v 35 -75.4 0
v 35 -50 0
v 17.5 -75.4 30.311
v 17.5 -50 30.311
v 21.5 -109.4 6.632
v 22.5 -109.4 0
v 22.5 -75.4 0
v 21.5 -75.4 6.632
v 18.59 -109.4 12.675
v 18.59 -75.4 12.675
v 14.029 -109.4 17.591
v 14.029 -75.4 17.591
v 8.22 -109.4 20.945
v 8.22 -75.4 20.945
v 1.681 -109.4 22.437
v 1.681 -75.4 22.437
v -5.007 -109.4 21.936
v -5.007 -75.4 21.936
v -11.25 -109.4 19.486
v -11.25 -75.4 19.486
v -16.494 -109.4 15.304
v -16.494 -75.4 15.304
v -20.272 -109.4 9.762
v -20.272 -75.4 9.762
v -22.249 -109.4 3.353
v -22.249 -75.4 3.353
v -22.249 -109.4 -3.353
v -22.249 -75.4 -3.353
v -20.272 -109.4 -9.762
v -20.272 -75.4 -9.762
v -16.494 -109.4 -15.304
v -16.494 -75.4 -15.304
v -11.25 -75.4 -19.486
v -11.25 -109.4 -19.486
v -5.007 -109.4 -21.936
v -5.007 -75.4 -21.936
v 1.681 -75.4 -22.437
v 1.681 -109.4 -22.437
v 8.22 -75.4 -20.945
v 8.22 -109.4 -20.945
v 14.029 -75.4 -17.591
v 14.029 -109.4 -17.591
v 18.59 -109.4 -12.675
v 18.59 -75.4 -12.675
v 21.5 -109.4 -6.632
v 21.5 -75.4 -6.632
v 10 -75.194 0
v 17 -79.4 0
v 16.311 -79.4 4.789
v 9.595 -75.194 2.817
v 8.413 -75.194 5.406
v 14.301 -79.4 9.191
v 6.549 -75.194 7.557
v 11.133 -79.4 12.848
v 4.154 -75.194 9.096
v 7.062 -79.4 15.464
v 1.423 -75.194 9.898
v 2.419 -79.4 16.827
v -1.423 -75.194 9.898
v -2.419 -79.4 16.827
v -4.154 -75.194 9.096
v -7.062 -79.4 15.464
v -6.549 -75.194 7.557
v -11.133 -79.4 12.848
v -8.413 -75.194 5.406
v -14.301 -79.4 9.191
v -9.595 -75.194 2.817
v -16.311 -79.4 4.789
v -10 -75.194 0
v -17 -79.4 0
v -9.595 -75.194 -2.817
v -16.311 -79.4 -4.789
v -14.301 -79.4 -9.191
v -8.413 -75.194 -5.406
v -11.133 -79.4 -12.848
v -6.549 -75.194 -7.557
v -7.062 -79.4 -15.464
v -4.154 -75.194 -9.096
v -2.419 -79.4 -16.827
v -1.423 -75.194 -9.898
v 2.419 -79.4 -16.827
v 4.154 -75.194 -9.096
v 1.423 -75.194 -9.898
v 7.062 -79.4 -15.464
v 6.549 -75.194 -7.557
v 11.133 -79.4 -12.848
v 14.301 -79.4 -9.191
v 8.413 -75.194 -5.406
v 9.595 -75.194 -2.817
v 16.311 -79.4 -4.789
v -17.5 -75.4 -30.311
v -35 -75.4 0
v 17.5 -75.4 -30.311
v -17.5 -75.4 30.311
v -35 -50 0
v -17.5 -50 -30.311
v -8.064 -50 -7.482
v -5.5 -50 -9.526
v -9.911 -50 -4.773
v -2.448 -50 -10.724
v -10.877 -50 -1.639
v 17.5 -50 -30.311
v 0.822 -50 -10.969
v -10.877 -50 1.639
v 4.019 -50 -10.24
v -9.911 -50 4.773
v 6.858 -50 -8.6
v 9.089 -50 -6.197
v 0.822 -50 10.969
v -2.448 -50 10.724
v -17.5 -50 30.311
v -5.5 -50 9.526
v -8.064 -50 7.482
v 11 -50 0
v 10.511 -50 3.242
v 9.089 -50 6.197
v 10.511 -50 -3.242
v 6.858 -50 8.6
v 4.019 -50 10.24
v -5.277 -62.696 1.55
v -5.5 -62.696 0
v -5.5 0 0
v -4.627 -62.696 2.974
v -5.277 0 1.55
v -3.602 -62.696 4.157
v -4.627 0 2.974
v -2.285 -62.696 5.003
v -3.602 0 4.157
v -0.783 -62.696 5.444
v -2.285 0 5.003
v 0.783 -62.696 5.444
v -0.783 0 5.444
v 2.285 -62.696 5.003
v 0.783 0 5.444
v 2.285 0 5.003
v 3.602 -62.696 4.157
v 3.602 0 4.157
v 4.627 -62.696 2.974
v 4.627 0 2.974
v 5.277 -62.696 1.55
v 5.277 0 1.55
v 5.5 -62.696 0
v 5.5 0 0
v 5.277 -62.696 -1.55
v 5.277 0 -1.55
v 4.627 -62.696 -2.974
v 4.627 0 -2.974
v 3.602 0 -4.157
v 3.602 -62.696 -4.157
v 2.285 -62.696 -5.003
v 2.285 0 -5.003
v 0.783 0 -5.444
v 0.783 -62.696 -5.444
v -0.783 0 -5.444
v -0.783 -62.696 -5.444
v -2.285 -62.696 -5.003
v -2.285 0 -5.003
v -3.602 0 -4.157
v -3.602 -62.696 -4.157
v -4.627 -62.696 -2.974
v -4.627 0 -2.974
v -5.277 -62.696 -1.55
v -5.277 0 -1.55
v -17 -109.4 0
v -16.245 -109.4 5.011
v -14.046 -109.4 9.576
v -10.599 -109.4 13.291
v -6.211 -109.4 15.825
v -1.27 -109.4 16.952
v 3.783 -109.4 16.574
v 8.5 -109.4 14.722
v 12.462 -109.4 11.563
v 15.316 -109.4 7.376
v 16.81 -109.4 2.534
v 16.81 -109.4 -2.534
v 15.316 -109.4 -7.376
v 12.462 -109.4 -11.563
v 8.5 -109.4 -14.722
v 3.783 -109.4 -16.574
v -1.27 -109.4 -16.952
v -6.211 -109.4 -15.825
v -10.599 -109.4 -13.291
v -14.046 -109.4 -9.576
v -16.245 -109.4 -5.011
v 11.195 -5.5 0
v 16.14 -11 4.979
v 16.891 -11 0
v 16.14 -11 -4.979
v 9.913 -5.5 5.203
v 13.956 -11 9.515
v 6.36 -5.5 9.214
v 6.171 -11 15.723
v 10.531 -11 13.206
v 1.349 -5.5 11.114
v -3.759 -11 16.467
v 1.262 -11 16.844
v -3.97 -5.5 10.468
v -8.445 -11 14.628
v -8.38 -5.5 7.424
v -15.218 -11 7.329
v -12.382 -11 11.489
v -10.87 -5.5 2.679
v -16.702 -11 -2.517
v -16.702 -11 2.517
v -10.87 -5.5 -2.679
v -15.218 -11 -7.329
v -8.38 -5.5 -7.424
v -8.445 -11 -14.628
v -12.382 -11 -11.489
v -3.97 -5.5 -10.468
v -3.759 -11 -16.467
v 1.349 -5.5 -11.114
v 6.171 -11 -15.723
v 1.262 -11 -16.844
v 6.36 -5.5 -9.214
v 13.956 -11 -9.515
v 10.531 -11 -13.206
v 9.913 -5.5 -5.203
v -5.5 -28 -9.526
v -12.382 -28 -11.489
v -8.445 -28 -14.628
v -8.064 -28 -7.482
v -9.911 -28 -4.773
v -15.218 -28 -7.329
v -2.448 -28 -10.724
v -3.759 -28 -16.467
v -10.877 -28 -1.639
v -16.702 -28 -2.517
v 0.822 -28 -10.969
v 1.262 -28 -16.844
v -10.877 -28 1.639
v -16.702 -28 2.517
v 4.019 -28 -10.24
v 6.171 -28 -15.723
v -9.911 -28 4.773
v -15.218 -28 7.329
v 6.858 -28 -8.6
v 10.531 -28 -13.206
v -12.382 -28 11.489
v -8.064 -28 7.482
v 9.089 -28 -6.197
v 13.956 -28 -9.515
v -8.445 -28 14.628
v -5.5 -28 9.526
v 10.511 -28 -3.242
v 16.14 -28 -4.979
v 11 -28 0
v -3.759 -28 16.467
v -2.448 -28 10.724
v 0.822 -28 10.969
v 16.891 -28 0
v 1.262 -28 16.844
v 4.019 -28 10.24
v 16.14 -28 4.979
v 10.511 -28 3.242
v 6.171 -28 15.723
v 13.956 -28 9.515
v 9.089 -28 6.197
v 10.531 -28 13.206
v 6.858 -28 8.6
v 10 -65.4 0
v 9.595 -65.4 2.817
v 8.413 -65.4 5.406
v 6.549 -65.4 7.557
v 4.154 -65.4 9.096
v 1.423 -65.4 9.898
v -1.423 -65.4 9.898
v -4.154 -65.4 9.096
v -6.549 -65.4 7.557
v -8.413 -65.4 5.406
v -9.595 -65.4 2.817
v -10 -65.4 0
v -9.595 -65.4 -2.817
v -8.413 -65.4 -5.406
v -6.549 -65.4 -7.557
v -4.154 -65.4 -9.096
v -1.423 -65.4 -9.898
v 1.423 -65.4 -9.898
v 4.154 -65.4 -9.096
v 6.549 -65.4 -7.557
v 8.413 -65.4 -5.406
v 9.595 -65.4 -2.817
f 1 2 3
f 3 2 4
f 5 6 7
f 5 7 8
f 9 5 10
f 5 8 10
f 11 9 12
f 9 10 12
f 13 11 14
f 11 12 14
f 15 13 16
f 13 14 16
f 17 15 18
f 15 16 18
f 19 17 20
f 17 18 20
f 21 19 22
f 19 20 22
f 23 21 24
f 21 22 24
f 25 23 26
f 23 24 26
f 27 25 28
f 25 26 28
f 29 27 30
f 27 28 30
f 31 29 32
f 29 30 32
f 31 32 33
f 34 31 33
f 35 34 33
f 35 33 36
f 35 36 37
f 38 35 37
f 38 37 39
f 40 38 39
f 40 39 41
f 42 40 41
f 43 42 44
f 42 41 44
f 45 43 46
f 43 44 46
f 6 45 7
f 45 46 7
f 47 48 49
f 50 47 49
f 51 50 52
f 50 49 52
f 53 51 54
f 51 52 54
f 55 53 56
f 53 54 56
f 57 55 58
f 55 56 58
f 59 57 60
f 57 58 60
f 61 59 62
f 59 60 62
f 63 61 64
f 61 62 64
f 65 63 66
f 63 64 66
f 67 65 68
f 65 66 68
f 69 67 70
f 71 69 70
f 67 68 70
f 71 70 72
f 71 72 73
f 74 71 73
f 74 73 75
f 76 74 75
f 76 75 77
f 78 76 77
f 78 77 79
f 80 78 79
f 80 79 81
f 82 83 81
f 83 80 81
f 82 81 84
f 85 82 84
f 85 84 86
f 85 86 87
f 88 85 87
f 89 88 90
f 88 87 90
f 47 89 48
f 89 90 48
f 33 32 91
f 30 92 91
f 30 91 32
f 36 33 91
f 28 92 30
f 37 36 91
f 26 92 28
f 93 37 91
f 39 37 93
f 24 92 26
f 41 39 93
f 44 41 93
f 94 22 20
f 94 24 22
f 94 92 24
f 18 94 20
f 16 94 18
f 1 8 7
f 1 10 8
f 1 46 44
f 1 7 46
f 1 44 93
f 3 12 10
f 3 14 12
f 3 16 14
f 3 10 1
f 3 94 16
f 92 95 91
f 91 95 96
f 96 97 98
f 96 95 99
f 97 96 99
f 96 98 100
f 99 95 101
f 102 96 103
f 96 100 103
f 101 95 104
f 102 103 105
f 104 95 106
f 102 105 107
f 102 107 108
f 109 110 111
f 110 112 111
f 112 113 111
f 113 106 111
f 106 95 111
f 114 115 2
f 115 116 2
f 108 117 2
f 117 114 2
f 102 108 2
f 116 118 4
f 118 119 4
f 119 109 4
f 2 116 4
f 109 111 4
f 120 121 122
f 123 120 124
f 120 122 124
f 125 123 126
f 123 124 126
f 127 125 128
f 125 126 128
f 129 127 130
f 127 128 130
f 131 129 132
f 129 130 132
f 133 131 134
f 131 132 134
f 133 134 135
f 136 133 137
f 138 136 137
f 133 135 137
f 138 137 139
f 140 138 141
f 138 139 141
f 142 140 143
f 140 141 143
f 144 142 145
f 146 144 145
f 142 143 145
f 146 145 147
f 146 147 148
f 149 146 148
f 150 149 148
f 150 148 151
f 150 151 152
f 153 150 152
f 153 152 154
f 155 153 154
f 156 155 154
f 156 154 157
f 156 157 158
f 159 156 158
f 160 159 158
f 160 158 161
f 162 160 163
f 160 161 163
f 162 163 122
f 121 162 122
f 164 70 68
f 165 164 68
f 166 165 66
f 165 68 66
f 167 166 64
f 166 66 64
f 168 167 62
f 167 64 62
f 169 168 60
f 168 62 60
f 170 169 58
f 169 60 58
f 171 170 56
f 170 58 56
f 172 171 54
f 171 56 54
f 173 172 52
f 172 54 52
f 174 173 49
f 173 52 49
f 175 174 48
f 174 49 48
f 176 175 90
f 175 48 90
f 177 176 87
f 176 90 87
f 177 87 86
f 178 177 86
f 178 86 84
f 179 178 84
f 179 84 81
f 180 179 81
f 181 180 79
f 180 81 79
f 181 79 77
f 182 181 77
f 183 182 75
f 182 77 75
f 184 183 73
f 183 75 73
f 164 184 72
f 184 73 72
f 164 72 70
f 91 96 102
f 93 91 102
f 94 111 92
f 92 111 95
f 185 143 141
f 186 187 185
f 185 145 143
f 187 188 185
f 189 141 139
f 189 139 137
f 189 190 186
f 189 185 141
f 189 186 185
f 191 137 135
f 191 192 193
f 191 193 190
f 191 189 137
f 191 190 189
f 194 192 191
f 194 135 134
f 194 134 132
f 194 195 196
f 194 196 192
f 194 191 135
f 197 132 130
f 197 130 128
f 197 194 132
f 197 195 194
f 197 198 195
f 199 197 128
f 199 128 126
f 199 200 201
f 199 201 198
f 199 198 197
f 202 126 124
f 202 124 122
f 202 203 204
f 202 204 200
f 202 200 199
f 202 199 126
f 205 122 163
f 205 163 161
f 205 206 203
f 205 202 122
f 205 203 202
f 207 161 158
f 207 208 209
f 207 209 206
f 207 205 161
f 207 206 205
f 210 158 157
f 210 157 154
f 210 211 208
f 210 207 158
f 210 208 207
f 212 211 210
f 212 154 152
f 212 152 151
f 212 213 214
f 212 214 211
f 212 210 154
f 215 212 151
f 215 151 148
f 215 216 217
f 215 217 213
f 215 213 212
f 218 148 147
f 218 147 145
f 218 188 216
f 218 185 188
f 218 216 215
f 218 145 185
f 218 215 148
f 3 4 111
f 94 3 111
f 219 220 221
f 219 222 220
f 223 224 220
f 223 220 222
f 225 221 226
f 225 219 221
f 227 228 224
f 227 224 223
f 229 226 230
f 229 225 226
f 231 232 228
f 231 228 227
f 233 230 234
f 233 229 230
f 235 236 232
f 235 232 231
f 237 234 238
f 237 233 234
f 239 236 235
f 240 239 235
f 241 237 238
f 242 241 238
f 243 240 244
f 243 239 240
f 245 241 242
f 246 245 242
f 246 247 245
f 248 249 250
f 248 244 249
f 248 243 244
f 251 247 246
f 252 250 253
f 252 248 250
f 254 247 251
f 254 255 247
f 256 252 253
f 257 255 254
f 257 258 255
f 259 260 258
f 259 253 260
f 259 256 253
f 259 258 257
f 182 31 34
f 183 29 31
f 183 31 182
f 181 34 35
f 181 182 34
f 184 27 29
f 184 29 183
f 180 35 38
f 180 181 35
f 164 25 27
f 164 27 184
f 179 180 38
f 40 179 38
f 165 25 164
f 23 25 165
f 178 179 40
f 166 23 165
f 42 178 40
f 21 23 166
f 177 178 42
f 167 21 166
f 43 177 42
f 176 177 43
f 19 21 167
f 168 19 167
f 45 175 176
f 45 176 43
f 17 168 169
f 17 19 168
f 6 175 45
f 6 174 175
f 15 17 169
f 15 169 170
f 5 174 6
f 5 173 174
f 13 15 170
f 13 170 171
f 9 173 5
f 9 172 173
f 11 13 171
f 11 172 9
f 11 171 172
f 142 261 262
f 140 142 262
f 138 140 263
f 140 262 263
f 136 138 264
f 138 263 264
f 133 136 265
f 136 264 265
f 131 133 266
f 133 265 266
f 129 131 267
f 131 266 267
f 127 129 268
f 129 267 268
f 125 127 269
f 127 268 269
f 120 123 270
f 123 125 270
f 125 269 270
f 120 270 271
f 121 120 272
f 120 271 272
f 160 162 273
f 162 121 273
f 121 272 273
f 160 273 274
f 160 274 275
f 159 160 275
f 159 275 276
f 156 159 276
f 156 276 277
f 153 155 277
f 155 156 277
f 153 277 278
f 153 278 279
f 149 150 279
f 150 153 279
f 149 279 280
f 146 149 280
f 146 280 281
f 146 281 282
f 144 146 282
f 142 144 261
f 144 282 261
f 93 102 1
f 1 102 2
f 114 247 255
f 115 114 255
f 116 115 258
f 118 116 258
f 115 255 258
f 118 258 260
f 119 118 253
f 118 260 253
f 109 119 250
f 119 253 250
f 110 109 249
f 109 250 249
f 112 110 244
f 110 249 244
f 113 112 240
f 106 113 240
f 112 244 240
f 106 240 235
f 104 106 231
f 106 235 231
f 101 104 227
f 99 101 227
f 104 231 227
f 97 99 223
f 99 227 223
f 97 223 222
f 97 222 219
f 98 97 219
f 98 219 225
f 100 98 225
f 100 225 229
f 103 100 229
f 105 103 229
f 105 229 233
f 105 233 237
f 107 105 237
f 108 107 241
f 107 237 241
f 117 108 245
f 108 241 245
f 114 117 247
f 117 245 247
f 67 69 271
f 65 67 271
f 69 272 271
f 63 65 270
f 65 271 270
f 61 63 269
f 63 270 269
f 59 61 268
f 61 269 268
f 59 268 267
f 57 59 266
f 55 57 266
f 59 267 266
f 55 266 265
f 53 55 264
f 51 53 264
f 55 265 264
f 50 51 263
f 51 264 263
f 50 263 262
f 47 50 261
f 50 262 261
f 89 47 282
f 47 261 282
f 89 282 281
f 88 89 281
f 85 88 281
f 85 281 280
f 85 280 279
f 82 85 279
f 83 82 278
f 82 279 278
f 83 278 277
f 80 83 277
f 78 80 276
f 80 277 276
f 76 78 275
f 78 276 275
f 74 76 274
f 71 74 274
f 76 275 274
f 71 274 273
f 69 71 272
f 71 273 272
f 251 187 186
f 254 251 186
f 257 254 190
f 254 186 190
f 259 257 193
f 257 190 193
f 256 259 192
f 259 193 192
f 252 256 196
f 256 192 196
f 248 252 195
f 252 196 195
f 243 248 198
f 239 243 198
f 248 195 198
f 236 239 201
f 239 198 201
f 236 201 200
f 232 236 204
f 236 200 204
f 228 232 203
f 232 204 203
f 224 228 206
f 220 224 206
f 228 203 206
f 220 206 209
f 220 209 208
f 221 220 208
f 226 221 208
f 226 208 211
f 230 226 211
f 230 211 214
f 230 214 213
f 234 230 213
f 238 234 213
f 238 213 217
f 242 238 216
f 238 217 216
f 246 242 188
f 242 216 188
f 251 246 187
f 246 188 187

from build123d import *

# Parameters (mm, degrees)
F0_R            = 5.5
F1_DEPTH        = 11
F1_TAPER        = -46
F2_R            = 16.8908334517
F3_DEPTH        = 17
F4_R            = 11
F5_DEPTH        = 22
F6_R            = 11
F7_DEPTH        = 25.4
F8_R            = 22.5
F8_R_2          = 5.5
F9_DEPTH        = 34
F11_D           = 34
F11_DEPTH       = 30
F11_TIP         = 10.2146305235
F12_D           = 20
F12_DEPTH       = 44
F12_CSINK_D     = 34
F12_CSINK_ANGLE = 46
F12_TIP         = 6.0086061903
F13_D           = 11
F13_DEPTH       = 65
F13_START       = 46.7038728
F13_TIP         = 3.3047334047


with BuildPart() as f1:
    # F0 (on Front) → F1 (new body)
    with BuildSketch(Plane.XZ):
        Circle(F0_R)
    extrude(amount=F1_DEPTH, taper=F1_TAPER)

    # F2 (on face) → F3 (join)
    with BuildSketch(Plane.XZ.offset(11)):
        Circle(F2_R)
    extrude(amount=F3_DEPTH)

    # F4 (on face) → F5 (join)
    with BuildSketch(Plane.XZ.offset(28)):
        Circle(F4_R)
    extrude(amount=F5_DEPTH)

    # F6 (on face) → F7 (join)
    with BuildSketch(Plane.XZ.offset(50)):
        Polygon((17.5, -30.3108891325), (35, 0), (17.5, 30.3108891325), (-17.5, 30.3108891325), (-35, 0), (-17.5, -30.3108891325), align=None)
        Circle(F6_R, mode=Mode.SUBTRACT)
        Circle(F6_R)
    extrude(amount=F7_DEPTH)

    # F8 (on face) → F9 (join)
    with BuildSketch(Plane.XZ.offset(75.4)):
        Circle(F8_R)
        Circle(F8_R_2, mode=Mode.SUBTRACT)
        Circle(F8_R_2)
    extrude(amount=F9_DEPTH)

    # F11
    with Locations(Plane.XZ.offset(109.4)):
        with Locations((0, 0)):
            Hole(F11_D / 2, depth=F11_DEPTH)
            with Locations((0, 0, -(F11_DEPTH + F11_TIP / 2))):  # 118° drill point
                Cone(0, F11_D / 2, F11_TIP, mode=Mode.SUBTRACT)

    # F12
    with Locations(Plane.XZ.offset(109.4)):
        with Locations((0, 0)):
            CounterSinkHole(F12_D / 2, F12_CSINK_D / 2, depth=F12_DEPTH, counter_sink_angle=F12_CSINK_ANGLE)
            with Locations((0, 0, -(F12_DEPTH + F12_TIP / 2))):  # 118° drill point
                Cone(0, F12_D / 2, F12_TIP, mode=Mode.SUBTRACT)

    # F13
    # its depths count from where the whole tool has entered the part; down to there all is cleared
    with Locations(Plane.XZ.offset(109.4).offset(-F13_START)):
        with Locations((0, 0)):
            Hole(F13_D / 2, depth=F13_DEPTH)
            with Locations((0, 0, -(F13_DEPTH + F13_TIP / 2))):  # 118° drill point
                Cone(0, F13_D / 2, F13_TIP, mode=Mode.SUBTRACT)


solid = f1.part
